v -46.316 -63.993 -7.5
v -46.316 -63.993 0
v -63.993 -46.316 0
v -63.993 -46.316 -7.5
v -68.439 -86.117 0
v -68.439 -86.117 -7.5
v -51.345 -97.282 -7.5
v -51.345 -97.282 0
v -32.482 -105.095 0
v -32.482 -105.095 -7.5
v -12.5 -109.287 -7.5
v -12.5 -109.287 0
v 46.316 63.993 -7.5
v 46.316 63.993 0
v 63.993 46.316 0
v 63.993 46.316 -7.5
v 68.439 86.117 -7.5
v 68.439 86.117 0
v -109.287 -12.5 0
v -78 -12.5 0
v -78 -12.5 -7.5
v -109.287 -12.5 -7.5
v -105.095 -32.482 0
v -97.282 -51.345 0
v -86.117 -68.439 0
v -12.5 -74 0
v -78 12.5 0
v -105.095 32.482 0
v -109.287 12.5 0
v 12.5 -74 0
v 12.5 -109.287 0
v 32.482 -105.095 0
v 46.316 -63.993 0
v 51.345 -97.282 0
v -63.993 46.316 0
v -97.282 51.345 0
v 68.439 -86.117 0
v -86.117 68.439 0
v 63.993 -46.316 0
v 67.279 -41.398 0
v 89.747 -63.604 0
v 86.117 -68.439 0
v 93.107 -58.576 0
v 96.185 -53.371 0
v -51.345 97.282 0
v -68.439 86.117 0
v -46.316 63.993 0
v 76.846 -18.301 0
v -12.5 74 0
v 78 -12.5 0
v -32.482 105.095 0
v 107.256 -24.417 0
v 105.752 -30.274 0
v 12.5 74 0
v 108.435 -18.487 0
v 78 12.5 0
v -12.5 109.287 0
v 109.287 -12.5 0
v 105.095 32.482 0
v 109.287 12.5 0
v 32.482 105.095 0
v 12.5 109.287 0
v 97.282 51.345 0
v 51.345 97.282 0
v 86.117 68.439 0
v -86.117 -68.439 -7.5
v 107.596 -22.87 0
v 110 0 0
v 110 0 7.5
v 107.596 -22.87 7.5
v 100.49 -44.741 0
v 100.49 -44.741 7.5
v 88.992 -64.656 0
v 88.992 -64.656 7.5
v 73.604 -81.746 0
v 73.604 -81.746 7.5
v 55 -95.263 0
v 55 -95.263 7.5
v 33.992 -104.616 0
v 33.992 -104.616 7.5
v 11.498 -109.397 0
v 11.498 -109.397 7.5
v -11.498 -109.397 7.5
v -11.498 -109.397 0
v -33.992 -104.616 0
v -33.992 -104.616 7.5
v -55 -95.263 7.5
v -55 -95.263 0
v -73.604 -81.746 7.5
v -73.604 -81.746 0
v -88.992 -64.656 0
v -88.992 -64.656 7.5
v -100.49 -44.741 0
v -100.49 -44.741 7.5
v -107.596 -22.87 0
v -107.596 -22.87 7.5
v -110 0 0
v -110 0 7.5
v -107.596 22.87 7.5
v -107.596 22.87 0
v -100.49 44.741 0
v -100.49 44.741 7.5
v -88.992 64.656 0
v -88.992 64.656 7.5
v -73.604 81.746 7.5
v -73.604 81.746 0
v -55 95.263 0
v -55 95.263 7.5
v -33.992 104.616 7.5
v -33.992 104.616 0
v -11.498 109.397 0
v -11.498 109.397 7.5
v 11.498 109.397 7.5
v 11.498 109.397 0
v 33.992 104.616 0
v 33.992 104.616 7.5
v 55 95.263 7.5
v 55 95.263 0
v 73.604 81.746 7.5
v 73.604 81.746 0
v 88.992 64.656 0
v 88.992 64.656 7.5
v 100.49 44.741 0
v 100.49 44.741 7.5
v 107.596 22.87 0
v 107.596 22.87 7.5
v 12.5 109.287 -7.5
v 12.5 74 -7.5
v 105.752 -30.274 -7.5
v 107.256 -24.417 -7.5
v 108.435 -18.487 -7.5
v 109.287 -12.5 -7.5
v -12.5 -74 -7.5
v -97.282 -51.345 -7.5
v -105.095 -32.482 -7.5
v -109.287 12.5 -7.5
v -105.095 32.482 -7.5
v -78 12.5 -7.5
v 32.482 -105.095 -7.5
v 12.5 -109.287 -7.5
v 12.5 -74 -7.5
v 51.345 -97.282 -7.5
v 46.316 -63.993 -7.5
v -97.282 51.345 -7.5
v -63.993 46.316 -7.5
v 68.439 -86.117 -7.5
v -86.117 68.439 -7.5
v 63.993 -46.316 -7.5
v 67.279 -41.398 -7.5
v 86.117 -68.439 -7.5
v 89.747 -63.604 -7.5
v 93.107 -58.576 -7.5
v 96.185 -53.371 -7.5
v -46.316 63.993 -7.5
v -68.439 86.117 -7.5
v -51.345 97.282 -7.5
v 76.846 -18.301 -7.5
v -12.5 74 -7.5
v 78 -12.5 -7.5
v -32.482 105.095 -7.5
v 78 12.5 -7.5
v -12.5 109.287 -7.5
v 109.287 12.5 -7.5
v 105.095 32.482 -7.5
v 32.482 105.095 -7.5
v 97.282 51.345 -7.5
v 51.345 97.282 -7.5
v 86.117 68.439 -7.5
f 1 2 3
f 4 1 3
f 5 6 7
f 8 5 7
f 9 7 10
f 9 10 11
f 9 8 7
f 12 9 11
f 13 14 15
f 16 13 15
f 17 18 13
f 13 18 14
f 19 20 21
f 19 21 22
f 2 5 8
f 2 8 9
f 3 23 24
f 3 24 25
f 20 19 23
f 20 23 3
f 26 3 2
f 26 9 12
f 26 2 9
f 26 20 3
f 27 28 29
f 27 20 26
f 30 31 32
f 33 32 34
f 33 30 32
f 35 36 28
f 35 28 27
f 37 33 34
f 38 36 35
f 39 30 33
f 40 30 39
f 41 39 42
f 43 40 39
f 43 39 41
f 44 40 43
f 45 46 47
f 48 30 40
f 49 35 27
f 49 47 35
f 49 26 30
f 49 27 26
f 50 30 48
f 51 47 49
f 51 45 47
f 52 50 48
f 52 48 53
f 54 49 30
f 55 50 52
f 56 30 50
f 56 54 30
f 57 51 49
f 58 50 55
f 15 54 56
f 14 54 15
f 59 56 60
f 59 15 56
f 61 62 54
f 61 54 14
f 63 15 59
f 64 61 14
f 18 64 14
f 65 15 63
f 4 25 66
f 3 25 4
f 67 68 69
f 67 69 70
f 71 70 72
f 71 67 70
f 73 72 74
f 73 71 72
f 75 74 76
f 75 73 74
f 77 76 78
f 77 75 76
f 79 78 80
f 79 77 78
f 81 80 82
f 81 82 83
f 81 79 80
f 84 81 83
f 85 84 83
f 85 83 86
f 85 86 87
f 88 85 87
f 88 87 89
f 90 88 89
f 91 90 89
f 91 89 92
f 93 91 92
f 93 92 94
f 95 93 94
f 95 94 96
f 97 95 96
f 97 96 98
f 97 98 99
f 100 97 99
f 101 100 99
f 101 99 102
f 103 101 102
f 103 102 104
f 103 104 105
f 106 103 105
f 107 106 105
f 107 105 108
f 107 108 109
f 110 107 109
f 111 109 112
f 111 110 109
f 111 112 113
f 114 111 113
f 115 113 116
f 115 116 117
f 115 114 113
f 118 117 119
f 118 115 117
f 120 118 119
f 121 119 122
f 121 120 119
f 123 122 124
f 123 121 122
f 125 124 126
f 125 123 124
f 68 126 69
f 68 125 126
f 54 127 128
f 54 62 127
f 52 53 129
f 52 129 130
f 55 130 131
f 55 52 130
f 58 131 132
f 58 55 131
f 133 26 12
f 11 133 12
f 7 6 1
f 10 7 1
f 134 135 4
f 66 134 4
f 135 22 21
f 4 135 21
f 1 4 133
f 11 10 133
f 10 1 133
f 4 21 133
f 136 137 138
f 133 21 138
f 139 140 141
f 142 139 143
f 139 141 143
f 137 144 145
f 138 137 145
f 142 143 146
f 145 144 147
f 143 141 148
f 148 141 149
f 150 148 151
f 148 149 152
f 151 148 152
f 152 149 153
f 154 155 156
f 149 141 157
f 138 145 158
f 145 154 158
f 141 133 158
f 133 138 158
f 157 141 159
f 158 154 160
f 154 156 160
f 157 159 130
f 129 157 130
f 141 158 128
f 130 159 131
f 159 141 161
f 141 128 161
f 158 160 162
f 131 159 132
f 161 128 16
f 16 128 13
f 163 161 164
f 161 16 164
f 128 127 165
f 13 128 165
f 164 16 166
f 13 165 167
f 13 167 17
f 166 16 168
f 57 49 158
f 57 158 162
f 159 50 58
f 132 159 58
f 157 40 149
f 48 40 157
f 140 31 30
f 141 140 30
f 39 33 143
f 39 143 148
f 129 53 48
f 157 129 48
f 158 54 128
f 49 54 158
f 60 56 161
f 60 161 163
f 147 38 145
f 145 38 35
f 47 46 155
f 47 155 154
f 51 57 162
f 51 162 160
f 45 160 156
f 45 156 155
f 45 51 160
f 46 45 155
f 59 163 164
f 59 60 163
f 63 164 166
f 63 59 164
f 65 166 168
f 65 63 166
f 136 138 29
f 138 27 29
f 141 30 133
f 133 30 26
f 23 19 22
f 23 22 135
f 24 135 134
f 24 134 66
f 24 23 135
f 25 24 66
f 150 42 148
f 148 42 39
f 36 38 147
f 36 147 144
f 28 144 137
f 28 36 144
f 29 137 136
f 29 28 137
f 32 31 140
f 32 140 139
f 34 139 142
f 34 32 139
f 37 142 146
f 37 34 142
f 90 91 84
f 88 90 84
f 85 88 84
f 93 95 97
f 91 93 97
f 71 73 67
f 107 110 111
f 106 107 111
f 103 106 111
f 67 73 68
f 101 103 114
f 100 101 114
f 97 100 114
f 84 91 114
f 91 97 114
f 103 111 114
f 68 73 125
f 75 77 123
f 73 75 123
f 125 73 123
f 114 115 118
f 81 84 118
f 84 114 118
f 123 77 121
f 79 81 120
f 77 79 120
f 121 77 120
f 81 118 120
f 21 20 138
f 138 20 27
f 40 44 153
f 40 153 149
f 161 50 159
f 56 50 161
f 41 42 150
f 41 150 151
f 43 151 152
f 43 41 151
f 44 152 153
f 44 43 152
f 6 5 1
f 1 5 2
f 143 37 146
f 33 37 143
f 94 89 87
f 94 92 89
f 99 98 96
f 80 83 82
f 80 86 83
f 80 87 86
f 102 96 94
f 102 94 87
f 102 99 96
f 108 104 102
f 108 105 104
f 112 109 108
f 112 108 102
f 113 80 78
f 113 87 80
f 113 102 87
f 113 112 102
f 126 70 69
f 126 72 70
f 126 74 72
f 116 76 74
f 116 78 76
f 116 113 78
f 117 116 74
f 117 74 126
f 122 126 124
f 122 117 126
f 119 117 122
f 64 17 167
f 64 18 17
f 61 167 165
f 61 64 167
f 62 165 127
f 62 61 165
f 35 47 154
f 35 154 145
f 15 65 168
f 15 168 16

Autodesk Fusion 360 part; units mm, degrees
sketch "Skizze1" plane through (0, 0, 0) normal (0, 0, 1) x (1, 0, 0)
  circle A0 centre (0, 0) radius 110
  line L0 (-12.5, 110) -> (12.5, 110)
  line L1 (12.5, 110) -> (12.5, 74)
  line L2 (12.5, 74) -> (-12.5, 74)
  line L3 (-12.5, 74) -> (-12.5, 110)
  line L4 (0, 0) -> (77.7817, 77.7817)
  line L5 (0, 0) -> (110, 0) construction
  line L6 (0, 0) -> (-77.7817, 77.7817)
  line L7 (0, 0) -> (110, 0) construction
  line L8 (77.7817, 77.7817) -> (68.9429, 86.6206)
  line L9 (77.7817, 77.7817) -> (86.6206, 68.9429)
  line L10 (86.6206, 68.9429) -> (63.9932, 46.3155)
  line L11 (68.9429, 86.6206) -> (46.3155, 63.9932)
  line L12 (46.3155, 63.9932) -> (63.9932, 46.3155)
  line L13 (0, 2.5) -> (0, 20)
  line L14 (-86.6206, 68.9429) -> (-63.9932, 46.3155)
  line L15 (-46.3155, 63.9932) -> (-63.9932, 46.3155)
  line L16 (-68.9429, 86.6206) -> (-46.3155, 63.9932)
  line L17 (-77.7817, 77.7817) -> (-68.9429, 86.6206)
  line L18 (-77.7817, 77.7817) -> (-86.6206, 68.9429)
  line L19 (110, 0) -> (78, 0)
  line L20 (78, 0) -> (78, 12.5)
  line L21 (78, 12.5) -> (110, 12.5)
  line L22 (110, 12.5) -> (110, 0)
  line L23 (-78, 0) -> (-78, 12.5)
  line L24 (-78, 12.5) -> (-110, 12.5)
  line L25 (-110, 12.5) -> (-110, 0)
  line L26 (-78, -12.5) -> (-110, -12.5)
  line L27 (-78, 0) -> (-78, -12.5)
  line L28 (-86.6206, -68.9429) -> (-63.9932, -46.3155)
  line L29 (-77.7817, -77.7817) -> (-86.6206, -68.9429)
  line L30 (-77.7817, -77.7817) -> (-68.9429, -86.6206)
  line L31 (-68.9429, -86.6206) -> (-46.3155, -63.9932)
  line L32 (-46.3155, -63.9932) -> (-63.9932, -46.3155)
  line L33 (12.5, -74) -> (-12.5, -74)
  line L34 (12.5, -110) -> (12.5, -74)
  line L35 (-12.5, -74) -> (-12.5, -110)
  line L36 (-12.5, -110) -> (12.5, -110)
  line L37 (77.7817, -77.7817) -> (68.9429, -86.6206)
  line L38 (77.7817, -77.7817) -> (86.6206, -68.9429)
  line L39 (86.6206, -68.9429) -> (63.9932, -46.3155)
  line L40 (46.3155, -63.9932) -> (63.9932, -46.3155)
  line L41 (68.9429, -86.6206) -> (46.3155, -63.9932)
  line L42 (78, 0) -> (78, -12.5)
  line L43 (78, -12.5) -> (110, -12.5)
  line L44 (110, -12.5) -> (110, 0)
  line L45 (0, 0) -> (-55.1543, -55.1543)
  line L46 (0, 0) -> (55.1543, -55.1543)
  line L47 (0, 0) -> (-78, 0)
  line L48 (0, 0) -> (78, 0)
  line L49 (0, 0) -> (101.6267, -42.0952)
  line L50 (0, 0) -> (110, 0) construction
  line L51 (101.6267, -42.0952) -> (96.8432, -53.6437)
  line L52 (101.6267, -42.0952) -> (106.4103, -30.5467)
  line L53 (96.8432, -53.6437) -> (67.2791, -41.3978)
  line L54 (106.4103, -30.5467) -> (76.8461, -18.3008)
  line L55 (67.2791, -41.3978) -> (76.8461, -18.3008)
  dimension "d1" = 25
  dimension "d2" = 36
  dimension "d3" = 12.5
  dimension "d4" = 110
  dimension "d5" = 45
  dimension "d6" = 135
  dimension "d7" = 12.5
  dimension "d8" = 12.5
  dimension "d9" = 32
  dimension "d10" = 32
  dimension "d11" = 32
  dimension "d12" = 12.5
  dimension "d13" = 22.5
  dimension "d14" = 12.5
  dimension "d15" = 12.5
  dimension "d16" = 32
  dimension "d17" = 32
extrude "Extrusion1" add sketch "Skizze1" along normal blind 7.5 contours A0 L19 L20 L21 | A0 L19 L42 L43 | A0 L4 L10 L12 L20 L21 L48 | A0 L42 L43 L48 L49 L54 L55 | A0 L4 L10 L12 | A0 L49 L54 L55 | A0 L1 L2 L3 L4 L6 L11 L12 L15 L16 | A0 L6 L14 L15 L23 L24 L47 | A0 L31 L32 L33 L34 L35 L40 L41 L45 L46 | A0 L39 L40 L46 L49 L53 L55 | A0 L26 L27 L28 L32 L45 L47 | A0 L4 L11 L12 | A0 L49 L53 L55 | A0 L6 L14 L15 | A0 L6 L15 L16 | A0 L28 L31 L32 | A0 L39 L40 L41 | A0 L23 L24 L26 L27 | A0 L1 L2 L3 | A0 L33 L34 L35 makes body 1
extrude "Extrusion2" add sketch "Skizze1" against normal blind 7.5 separate body contours A0 L4 L10 L12 L20 L21 L48 | A0 L42 L43 L48 L49 L54 L55 | A0 L1 L2 L3 L4 L6 L11 L12 L15 L16 | A0 L6 L14 L15 L23 L24 L47 | A0 L31 L32 L33 L34 L35 L40 L41 L45 L46 | A0 L39 L40 L46 L49 L53 L55 | A0 L26 L27 L28 L32 L45 L47 makes body 2
